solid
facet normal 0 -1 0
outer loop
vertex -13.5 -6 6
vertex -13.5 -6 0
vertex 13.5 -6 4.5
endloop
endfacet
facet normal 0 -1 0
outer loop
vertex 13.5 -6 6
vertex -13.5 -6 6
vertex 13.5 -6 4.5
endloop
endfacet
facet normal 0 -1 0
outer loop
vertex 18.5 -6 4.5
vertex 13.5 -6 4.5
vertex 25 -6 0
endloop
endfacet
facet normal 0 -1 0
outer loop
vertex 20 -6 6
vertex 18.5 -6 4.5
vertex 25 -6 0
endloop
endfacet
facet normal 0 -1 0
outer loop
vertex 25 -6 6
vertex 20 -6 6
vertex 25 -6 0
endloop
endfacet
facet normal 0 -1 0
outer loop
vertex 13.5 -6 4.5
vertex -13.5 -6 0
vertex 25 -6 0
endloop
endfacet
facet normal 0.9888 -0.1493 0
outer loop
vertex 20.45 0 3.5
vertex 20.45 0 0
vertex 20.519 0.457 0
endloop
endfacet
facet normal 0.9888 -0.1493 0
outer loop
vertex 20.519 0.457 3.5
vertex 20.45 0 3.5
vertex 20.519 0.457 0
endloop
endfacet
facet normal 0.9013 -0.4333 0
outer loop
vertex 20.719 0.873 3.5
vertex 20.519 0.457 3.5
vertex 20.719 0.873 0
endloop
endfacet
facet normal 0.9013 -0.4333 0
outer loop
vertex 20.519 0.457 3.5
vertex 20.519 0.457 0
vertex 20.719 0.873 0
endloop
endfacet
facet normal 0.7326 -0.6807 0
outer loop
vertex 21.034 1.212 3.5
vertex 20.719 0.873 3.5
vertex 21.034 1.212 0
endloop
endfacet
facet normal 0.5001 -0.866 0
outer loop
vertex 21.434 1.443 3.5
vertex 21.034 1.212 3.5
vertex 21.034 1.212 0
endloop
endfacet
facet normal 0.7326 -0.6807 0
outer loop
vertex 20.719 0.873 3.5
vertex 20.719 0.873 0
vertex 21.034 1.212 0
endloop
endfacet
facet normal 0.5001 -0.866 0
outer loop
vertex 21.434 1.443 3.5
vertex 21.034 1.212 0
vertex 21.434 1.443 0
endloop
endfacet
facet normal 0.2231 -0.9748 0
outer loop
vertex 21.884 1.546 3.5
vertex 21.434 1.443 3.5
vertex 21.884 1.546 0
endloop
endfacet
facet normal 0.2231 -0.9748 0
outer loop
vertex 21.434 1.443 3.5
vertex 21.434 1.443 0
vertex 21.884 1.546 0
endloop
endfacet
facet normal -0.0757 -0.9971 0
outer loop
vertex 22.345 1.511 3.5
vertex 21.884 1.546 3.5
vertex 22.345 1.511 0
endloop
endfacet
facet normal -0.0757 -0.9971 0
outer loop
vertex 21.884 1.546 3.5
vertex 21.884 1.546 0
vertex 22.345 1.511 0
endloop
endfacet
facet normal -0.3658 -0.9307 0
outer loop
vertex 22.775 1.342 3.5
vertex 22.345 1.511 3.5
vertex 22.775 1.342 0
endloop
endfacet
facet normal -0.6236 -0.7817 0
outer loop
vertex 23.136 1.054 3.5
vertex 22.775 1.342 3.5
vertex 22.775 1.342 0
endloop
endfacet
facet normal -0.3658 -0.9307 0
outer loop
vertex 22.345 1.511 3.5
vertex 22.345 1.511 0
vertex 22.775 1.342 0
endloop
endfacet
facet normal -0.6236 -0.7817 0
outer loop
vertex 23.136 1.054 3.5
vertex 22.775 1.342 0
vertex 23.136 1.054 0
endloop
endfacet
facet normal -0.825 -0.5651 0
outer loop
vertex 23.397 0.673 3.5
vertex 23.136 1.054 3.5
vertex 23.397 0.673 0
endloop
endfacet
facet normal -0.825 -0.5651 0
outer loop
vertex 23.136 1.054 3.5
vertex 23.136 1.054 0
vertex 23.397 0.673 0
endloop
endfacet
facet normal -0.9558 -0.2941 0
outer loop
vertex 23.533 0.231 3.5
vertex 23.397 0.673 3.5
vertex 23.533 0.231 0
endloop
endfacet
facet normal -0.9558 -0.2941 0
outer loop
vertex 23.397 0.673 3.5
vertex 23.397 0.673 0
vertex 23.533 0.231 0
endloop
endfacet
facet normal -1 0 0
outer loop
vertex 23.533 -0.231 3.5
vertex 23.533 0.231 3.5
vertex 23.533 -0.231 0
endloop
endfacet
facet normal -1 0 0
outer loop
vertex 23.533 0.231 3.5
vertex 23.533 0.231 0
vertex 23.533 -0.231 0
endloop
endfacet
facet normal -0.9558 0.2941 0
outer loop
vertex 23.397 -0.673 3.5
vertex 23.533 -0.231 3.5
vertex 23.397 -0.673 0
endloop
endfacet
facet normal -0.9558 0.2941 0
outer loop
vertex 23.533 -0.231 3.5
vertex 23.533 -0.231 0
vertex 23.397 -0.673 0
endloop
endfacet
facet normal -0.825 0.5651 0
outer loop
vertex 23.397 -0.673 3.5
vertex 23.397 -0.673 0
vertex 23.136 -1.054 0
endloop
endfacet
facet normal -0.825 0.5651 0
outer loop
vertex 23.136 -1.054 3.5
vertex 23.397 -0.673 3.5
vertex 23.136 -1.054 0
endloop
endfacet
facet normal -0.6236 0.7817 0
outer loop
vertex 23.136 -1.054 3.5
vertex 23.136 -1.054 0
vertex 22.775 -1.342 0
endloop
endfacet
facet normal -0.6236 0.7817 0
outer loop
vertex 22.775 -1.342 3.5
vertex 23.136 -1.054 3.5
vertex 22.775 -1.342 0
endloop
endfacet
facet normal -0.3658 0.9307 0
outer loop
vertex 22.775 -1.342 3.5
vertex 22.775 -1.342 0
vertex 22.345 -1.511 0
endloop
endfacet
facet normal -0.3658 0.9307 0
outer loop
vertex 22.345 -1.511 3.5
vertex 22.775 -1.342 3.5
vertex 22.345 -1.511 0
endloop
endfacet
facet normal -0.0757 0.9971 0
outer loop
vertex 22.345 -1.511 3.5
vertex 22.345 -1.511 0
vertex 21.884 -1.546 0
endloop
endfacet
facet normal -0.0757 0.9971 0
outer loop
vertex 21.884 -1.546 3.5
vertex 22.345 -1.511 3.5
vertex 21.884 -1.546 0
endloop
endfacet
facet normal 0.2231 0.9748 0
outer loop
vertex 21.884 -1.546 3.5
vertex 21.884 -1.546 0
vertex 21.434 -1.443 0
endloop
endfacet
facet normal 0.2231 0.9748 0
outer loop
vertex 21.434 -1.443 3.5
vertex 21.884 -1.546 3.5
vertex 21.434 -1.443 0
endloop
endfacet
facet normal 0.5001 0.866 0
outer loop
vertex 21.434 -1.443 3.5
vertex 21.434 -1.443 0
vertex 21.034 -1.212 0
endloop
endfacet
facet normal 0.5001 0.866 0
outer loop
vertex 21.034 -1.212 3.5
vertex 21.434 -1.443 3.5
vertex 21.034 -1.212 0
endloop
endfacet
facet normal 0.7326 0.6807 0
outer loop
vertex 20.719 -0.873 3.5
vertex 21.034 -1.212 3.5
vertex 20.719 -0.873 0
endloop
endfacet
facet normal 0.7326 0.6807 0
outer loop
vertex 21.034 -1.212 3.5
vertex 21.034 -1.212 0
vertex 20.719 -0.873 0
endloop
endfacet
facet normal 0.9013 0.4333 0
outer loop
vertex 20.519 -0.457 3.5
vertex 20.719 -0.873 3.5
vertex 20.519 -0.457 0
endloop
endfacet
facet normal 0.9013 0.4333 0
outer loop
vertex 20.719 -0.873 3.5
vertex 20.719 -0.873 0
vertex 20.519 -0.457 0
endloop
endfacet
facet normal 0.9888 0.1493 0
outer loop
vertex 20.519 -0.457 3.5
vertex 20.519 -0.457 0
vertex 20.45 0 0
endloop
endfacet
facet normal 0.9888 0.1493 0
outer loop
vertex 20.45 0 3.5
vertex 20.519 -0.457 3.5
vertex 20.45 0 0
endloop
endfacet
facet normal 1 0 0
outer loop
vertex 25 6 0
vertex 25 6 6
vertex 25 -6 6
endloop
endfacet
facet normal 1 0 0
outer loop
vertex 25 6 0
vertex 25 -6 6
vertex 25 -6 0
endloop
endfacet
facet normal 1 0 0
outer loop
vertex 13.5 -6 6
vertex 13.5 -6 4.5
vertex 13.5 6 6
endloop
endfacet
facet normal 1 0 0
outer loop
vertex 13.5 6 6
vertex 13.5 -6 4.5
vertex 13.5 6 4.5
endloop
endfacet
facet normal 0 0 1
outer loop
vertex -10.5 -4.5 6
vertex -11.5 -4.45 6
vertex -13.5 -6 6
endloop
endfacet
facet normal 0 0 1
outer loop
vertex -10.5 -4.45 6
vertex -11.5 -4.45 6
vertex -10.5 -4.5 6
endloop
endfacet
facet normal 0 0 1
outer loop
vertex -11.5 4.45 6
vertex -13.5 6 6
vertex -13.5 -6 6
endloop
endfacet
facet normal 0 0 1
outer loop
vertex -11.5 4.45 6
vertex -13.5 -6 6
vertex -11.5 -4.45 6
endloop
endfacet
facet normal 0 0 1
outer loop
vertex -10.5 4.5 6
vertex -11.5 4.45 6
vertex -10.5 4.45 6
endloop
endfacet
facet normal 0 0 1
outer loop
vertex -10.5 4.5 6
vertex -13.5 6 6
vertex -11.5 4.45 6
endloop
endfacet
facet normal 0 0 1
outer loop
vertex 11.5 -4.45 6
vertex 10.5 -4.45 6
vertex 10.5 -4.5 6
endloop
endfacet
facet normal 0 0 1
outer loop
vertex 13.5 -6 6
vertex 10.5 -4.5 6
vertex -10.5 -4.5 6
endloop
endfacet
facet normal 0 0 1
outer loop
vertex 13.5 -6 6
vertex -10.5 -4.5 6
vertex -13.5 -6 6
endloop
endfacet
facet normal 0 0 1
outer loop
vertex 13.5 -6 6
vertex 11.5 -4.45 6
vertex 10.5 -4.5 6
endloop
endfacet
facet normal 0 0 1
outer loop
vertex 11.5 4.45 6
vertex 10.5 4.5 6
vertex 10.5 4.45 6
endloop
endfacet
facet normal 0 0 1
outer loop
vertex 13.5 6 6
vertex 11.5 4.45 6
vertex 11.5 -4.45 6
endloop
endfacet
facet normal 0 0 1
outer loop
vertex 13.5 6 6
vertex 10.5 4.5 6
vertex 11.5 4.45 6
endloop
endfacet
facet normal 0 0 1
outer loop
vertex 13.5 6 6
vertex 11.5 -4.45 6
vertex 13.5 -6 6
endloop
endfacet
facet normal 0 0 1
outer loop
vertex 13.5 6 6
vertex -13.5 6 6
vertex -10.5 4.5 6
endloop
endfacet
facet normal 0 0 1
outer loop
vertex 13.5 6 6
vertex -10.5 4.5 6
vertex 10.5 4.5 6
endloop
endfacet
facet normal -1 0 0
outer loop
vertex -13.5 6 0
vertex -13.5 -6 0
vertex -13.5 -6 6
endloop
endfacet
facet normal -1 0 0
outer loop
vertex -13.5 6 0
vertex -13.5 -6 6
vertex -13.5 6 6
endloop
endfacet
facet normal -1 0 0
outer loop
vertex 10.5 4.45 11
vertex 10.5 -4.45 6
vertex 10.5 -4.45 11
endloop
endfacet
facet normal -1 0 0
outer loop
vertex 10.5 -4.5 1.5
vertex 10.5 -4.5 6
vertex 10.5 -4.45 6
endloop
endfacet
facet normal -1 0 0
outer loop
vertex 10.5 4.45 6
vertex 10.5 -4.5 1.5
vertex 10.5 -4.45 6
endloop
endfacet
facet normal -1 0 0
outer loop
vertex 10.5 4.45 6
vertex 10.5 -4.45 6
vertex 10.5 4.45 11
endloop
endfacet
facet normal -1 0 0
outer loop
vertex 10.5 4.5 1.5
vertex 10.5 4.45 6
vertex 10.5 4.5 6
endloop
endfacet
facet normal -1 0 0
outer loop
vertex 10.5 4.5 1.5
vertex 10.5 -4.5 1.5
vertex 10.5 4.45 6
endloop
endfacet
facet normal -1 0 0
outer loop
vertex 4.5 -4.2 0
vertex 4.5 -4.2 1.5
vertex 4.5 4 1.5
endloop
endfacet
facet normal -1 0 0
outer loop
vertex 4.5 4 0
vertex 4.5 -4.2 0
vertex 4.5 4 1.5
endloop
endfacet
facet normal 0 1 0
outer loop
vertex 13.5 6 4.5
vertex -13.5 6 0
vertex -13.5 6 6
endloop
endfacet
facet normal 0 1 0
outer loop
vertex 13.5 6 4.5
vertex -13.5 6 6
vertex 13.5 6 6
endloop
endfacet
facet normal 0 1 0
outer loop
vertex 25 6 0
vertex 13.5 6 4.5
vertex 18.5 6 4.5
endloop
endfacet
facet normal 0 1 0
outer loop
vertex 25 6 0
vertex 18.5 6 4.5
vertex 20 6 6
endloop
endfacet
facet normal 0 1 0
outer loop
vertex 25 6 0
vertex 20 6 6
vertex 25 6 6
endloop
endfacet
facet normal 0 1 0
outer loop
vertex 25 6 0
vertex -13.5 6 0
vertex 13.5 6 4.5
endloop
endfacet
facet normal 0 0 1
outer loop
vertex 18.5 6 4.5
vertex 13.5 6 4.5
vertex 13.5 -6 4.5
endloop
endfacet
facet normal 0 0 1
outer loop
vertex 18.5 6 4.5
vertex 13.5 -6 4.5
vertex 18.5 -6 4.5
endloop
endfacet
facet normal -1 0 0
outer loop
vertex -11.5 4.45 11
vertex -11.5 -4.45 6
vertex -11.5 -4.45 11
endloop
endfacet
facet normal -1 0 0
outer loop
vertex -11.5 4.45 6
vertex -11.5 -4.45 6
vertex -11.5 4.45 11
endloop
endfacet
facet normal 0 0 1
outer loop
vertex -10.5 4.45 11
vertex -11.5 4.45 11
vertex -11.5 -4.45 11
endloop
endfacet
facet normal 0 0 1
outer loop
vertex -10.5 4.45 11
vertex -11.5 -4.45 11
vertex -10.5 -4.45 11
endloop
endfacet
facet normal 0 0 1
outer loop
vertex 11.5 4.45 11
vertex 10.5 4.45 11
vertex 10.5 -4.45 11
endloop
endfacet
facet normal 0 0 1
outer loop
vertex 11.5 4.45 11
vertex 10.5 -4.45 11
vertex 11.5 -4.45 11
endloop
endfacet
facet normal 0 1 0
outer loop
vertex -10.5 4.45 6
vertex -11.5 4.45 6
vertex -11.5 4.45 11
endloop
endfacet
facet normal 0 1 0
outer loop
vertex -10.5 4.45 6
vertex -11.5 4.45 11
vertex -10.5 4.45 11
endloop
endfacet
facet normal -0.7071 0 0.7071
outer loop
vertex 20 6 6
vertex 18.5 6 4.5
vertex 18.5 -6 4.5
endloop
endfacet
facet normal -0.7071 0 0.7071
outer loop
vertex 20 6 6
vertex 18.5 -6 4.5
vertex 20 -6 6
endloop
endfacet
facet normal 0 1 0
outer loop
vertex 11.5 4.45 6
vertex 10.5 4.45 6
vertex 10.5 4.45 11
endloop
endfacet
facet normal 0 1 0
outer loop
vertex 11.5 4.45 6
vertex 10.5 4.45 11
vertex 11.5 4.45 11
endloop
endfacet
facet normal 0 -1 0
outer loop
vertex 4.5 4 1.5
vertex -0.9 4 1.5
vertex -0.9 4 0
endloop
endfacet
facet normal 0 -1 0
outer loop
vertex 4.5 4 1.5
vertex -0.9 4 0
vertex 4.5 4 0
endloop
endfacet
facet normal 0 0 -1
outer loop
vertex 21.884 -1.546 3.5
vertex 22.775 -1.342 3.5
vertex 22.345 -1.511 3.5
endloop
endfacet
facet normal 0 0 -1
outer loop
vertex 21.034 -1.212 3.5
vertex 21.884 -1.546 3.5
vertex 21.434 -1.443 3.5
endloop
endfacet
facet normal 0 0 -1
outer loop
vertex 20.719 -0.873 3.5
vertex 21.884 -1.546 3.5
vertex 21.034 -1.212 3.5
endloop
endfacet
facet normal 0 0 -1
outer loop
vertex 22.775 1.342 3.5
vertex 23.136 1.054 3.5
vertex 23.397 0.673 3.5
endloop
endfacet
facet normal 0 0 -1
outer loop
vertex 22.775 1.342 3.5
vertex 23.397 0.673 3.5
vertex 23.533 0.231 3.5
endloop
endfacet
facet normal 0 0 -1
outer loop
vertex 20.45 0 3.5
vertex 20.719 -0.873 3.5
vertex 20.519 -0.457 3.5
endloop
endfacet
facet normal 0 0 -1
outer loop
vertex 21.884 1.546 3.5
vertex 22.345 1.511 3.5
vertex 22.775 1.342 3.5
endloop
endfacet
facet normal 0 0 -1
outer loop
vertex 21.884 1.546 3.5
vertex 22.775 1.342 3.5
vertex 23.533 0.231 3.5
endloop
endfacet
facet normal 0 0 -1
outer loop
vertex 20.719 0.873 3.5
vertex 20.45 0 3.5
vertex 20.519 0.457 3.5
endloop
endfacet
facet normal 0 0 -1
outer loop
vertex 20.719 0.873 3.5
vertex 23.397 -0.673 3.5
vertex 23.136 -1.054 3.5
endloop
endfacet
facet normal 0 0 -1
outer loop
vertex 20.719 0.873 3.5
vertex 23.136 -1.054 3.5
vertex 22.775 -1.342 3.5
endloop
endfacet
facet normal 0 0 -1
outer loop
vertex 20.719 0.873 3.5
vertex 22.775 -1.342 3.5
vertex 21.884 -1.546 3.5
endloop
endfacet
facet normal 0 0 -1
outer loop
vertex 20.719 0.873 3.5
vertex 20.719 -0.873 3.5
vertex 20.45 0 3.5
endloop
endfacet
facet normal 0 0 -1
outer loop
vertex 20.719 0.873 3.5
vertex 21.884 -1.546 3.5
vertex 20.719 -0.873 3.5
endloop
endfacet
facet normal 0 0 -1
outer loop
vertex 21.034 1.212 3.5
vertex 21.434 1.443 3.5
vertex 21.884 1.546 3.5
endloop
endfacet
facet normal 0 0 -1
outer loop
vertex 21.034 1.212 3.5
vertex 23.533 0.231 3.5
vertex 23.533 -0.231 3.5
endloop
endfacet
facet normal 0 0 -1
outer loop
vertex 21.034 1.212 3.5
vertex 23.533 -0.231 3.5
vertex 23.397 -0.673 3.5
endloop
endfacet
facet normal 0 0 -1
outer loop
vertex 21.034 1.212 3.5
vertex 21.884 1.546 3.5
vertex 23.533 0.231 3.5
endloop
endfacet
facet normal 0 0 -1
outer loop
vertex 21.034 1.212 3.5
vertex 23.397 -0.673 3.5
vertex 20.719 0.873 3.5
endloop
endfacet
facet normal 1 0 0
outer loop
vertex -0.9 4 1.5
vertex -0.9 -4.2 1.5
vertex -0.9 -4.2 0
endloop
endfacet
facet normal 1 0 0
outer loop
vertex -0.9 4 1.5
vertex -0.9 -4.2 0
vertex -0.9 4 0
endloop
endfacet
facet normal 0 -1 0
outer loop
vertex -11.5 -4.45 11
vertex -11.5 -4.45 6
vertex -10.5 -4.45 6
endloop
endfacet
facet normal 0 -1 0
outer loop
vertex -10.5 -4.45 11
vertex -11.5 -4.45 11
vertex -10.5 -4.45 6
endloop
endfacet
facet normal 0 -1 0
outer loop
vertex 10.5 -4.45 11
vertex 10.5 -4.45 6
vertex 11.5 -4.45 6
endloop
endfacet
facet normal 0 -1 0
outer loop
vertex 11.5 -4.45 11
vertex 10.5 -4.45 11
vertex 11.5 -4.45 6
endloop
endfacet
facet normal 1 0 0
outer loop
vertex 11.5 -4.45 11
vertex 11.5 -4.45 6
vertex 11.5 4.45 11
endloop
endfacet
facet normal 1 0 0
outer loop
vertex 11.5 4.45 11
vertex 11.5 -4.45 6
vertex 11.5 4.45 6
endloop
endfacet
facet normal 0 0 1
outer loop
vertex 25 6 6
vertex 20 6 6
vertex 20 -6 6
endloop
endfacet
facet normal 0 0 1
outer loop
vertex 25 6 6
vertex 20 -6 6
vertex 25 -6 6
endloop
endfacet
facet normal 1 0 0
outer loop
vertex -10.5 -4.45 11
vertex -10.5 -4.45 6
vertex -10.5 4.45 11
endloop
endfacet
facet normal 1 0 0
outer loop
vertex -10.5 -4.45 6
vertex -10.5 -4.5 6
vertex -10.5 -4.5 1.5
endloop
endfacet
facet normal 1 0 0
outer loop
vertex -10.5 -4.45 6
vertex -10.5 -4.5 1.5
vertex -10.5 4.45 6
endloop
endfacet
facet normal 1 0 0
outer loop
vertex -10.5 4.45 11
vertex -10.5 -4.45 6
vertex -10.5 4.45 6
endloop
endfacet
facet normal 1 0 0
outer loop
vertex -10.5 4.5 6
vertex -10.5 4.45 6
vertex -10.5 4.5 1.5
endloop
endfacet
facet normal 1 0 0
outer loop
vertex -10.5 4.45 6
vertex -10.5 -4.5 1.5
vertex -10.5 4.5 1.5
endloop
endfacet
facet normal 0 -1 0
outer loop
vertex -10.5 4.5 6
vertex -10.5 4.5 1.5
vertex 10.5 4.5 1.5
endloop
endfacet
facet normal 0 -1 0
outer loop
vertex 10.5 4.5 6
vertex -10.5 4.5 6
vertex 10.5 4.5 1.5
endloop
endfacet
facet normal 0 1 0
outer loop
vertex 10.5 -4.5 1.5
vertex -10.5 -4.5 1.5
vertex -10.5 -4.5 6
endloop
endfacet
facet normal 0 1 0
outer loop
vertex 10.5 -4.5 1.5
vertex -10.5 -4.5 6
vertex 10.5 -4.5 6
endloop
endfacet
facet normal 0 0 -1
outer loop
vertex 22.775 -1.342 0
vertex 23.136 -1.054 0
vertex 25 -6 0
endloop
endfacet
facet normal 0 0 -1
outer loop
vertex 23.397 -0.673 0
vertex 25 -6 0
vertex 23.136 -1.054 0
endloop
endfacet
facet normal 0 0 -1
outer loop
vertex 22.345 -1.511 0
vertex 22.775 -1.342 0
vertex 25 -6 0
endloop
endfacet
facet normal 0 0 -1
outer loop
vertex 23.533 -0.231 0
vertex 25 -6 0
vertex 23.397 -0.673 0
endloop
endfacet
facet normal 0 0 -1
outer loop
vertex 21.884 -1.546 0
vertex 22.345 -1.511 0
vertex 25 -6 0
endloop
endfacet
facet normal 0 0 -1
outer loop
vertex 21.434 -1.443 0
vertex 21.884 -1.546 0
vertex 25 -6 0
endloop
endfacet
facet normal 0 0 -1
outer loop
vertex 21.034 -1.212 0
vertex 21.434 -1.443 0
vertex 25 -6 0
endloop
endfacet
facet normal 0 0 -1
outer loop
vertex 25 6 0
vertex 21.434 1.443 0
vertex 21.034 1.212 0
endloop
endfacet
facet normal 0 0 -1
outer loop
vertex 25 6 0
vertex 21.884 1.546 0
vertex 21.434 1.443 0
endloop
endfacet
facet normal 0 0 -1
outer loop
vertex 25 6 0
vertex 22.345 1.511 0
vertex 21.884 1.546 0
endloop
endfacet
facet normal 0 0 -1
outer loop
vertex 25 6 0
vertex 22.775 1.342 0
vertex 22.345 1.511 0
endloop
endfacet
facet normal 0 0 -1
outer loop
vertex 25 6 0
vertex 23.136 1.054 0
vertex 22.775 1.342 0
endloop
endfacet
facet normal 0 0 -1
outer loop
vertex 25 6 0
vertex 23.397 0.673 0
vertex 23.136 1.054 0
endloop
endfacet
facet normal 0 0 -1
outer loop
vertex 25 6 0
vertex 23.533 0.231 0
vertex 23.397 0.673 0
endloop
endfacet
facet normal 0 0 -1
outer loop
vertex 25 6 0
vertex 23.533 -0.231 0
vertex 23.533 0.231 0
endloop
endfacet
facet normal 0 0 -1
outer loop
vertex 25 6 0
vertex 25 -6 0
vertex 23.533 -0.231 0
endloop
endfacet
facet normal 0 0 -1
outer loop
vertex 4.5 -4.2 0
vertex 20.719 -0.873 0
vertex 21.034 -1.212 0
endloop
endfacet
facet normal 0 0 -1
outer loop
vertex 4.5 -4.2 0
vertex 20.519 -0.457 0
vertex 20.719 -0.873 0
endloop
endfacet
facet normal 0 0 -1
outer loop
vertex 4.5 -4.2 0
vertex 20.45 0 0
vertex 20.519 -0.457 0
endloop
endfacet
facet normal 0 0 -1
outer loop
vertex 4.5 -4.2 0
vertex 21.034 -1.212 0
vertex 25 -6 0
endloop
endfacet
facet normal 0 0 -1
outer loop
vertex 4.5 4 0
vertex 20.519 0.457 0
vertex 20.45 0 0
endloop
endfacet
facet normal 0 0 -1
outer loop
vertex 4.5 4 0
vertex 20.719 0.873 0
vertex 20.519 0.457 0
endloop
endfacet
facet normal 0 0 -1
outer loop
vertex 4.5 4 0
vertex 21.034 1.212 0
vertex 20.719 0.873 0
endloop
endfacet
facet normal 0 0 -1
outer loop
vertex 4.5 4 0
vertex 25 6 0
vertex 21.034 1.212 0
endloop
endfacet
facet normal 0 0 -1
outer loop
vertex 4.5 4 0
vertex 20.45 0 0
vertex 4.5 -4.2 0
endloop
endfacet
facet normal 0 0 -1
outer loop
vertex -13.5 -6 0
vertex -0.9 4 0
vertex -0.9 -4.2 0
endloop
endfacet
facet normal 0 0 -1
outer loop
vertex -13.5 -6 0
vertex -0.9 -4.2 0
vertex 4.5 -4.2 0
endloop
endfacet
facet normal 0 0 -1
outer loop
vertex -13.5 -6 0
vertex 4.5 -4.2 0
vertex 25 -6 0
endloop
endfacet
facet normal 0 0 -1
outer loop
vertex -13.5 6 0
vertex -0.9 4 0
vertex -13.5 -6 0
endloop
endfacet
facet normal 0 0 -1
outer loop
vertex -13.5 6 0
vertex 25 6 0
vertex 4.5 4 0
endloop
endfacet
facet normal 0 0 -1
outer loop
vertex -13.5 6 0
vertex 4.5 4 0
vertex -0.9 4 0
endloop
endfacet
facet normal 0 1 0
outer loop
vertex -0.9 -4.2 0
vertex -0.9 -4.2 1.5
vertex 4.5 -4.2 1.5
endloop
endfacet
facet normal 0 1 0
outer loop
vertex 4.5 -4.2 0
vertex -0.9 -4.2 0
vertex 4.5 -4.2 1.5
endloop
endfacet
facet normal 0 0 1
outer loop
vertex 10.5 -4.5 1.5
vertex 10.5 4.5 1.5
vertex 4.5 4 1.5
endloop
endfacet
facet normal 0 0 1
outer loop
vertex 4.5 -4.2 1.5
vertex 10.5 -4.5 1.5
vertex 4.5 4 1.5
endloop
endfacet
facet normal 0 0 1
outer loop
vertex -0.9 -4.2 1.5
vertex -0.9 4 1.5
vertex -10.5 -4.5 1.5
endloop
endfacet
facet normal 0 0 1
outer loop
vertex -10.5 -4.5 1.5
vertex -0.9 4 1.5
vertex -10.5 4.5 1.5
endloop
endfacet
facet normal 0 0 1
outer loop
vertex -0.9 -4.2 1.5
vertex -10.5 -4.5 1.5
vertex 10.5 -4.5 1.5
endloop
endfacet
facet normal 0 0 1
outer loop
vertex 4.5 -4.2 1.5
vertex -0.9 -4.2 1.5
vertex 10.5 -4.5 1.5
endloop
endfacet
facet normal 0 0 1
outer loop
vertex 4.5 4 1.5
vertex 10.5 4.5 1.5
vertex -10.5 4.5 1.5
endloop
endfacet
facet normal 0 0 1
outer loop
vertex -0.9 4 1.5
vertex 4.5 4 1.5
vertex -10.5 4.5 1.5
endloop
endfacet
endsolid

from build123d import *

# Parameters (mm, degrees)
SKETCH_1_W          = 27
SKETCH_1_H          = 12
SKETCH_1_W_2        = 21
SKETCH_1_H_2        = 9
EXTRUDE_1_DEPTH     = 6
SKETCH_2_W          = 21
SKETCH_2_H          = 9
EXTRUDE_2_DEPTH     = 1.5
SKETCH_3_W          = 5.4
SKETCH_3_H          = 8.2
CUT_EXTRUDE_1_DEPTH = 2.5
SKETCH_4_W          = 1
SKETCH_4_H          = 8.9
EXTRUDE_3_DEPTH     = 5
EXTRUDE_5_DEPTH     = 12
SKETCH_9_R          = 1.55
CUT_EXTRUDE_2_DEPTH = 3.5


with BuildPart() as part:
    # 草图1 → 凸台-拉伸1 (new body)
    with BuildSketch(Plane.XY):
        Rectangle(SKETCH_1_W, SKETCH_1_H)
        Rectangle(SKETCH_1_W_2, SKETCH_1_H_2, mode=Mode.SUBTRACT)
    extrude(amount=EXTRUDE_1_DEPTH)

    # 草图2 → 凸台-拉伸2 (add)
    with BuildSketch(Plane(origin=(0, 0, 0), x_dir=(-1, 0, 0), z_dir=(0, 0, -1))):
        Rectangle(SKETCH_2_W, SKETCH_2_H)
    extrude(amount=-EXTRUDE_2_DEPTH)

    # 草图3 → 切除-拉伸1 (cut, through all)
    with BuildSketch(Plane.XY.offset(1.5)):
        with Locations((1.8, -0.1)):
            Rectangle(SKETCH_3_W, SKETCH_3_H)
    extrude(amount=-CUT_EXTRUDE_1_DEPTH, mode=Mode.SUBTRACT)

    # 草图4 → 凸台-拉伸3 (add)
    with BuildSketch(Plane.XY.offset(6)):
        with Locations((-11, 0)):
            Rectangle(SKETCH_4_W, SKETCH_4_H)
        with Locations((11, 0)):
            Rectangle(SKETCH_4_W, SKETCH_4_H)
    extrude(amount=EXTRUDE_3_DEPTH)

    # 草图8 → 凸台-拉伸5 (add)
    with BuildSketch(Plane(origin=(0, 6, 0), x_dir=(1, 0, 0), z_dir=(0, 1, 0))):
        Polygon((13.5, -4.5), (18.5, -4.5), (20, -6), (25, -6), (25, 0), (20, 0), (13.5, 0), (13.5, -1.5), align=None)
    extrude(amount=-EXTRUDE_5_DEPTH)

    # 草图9 → 切除-拉伸2 (cut)
    with BuildSketch(Plane(origin=(0, 0, 0), x_dir=(-1, 0, 0), z_dir=(0, 0, -1))):
        with Locations((-22, 0)):
            Circle(SKETCH_9_R)
    extrude(amount=-CUT_EXTRUDE_2_DEPTH, mode=Mode.SUBTRACT)


solid = part.part
